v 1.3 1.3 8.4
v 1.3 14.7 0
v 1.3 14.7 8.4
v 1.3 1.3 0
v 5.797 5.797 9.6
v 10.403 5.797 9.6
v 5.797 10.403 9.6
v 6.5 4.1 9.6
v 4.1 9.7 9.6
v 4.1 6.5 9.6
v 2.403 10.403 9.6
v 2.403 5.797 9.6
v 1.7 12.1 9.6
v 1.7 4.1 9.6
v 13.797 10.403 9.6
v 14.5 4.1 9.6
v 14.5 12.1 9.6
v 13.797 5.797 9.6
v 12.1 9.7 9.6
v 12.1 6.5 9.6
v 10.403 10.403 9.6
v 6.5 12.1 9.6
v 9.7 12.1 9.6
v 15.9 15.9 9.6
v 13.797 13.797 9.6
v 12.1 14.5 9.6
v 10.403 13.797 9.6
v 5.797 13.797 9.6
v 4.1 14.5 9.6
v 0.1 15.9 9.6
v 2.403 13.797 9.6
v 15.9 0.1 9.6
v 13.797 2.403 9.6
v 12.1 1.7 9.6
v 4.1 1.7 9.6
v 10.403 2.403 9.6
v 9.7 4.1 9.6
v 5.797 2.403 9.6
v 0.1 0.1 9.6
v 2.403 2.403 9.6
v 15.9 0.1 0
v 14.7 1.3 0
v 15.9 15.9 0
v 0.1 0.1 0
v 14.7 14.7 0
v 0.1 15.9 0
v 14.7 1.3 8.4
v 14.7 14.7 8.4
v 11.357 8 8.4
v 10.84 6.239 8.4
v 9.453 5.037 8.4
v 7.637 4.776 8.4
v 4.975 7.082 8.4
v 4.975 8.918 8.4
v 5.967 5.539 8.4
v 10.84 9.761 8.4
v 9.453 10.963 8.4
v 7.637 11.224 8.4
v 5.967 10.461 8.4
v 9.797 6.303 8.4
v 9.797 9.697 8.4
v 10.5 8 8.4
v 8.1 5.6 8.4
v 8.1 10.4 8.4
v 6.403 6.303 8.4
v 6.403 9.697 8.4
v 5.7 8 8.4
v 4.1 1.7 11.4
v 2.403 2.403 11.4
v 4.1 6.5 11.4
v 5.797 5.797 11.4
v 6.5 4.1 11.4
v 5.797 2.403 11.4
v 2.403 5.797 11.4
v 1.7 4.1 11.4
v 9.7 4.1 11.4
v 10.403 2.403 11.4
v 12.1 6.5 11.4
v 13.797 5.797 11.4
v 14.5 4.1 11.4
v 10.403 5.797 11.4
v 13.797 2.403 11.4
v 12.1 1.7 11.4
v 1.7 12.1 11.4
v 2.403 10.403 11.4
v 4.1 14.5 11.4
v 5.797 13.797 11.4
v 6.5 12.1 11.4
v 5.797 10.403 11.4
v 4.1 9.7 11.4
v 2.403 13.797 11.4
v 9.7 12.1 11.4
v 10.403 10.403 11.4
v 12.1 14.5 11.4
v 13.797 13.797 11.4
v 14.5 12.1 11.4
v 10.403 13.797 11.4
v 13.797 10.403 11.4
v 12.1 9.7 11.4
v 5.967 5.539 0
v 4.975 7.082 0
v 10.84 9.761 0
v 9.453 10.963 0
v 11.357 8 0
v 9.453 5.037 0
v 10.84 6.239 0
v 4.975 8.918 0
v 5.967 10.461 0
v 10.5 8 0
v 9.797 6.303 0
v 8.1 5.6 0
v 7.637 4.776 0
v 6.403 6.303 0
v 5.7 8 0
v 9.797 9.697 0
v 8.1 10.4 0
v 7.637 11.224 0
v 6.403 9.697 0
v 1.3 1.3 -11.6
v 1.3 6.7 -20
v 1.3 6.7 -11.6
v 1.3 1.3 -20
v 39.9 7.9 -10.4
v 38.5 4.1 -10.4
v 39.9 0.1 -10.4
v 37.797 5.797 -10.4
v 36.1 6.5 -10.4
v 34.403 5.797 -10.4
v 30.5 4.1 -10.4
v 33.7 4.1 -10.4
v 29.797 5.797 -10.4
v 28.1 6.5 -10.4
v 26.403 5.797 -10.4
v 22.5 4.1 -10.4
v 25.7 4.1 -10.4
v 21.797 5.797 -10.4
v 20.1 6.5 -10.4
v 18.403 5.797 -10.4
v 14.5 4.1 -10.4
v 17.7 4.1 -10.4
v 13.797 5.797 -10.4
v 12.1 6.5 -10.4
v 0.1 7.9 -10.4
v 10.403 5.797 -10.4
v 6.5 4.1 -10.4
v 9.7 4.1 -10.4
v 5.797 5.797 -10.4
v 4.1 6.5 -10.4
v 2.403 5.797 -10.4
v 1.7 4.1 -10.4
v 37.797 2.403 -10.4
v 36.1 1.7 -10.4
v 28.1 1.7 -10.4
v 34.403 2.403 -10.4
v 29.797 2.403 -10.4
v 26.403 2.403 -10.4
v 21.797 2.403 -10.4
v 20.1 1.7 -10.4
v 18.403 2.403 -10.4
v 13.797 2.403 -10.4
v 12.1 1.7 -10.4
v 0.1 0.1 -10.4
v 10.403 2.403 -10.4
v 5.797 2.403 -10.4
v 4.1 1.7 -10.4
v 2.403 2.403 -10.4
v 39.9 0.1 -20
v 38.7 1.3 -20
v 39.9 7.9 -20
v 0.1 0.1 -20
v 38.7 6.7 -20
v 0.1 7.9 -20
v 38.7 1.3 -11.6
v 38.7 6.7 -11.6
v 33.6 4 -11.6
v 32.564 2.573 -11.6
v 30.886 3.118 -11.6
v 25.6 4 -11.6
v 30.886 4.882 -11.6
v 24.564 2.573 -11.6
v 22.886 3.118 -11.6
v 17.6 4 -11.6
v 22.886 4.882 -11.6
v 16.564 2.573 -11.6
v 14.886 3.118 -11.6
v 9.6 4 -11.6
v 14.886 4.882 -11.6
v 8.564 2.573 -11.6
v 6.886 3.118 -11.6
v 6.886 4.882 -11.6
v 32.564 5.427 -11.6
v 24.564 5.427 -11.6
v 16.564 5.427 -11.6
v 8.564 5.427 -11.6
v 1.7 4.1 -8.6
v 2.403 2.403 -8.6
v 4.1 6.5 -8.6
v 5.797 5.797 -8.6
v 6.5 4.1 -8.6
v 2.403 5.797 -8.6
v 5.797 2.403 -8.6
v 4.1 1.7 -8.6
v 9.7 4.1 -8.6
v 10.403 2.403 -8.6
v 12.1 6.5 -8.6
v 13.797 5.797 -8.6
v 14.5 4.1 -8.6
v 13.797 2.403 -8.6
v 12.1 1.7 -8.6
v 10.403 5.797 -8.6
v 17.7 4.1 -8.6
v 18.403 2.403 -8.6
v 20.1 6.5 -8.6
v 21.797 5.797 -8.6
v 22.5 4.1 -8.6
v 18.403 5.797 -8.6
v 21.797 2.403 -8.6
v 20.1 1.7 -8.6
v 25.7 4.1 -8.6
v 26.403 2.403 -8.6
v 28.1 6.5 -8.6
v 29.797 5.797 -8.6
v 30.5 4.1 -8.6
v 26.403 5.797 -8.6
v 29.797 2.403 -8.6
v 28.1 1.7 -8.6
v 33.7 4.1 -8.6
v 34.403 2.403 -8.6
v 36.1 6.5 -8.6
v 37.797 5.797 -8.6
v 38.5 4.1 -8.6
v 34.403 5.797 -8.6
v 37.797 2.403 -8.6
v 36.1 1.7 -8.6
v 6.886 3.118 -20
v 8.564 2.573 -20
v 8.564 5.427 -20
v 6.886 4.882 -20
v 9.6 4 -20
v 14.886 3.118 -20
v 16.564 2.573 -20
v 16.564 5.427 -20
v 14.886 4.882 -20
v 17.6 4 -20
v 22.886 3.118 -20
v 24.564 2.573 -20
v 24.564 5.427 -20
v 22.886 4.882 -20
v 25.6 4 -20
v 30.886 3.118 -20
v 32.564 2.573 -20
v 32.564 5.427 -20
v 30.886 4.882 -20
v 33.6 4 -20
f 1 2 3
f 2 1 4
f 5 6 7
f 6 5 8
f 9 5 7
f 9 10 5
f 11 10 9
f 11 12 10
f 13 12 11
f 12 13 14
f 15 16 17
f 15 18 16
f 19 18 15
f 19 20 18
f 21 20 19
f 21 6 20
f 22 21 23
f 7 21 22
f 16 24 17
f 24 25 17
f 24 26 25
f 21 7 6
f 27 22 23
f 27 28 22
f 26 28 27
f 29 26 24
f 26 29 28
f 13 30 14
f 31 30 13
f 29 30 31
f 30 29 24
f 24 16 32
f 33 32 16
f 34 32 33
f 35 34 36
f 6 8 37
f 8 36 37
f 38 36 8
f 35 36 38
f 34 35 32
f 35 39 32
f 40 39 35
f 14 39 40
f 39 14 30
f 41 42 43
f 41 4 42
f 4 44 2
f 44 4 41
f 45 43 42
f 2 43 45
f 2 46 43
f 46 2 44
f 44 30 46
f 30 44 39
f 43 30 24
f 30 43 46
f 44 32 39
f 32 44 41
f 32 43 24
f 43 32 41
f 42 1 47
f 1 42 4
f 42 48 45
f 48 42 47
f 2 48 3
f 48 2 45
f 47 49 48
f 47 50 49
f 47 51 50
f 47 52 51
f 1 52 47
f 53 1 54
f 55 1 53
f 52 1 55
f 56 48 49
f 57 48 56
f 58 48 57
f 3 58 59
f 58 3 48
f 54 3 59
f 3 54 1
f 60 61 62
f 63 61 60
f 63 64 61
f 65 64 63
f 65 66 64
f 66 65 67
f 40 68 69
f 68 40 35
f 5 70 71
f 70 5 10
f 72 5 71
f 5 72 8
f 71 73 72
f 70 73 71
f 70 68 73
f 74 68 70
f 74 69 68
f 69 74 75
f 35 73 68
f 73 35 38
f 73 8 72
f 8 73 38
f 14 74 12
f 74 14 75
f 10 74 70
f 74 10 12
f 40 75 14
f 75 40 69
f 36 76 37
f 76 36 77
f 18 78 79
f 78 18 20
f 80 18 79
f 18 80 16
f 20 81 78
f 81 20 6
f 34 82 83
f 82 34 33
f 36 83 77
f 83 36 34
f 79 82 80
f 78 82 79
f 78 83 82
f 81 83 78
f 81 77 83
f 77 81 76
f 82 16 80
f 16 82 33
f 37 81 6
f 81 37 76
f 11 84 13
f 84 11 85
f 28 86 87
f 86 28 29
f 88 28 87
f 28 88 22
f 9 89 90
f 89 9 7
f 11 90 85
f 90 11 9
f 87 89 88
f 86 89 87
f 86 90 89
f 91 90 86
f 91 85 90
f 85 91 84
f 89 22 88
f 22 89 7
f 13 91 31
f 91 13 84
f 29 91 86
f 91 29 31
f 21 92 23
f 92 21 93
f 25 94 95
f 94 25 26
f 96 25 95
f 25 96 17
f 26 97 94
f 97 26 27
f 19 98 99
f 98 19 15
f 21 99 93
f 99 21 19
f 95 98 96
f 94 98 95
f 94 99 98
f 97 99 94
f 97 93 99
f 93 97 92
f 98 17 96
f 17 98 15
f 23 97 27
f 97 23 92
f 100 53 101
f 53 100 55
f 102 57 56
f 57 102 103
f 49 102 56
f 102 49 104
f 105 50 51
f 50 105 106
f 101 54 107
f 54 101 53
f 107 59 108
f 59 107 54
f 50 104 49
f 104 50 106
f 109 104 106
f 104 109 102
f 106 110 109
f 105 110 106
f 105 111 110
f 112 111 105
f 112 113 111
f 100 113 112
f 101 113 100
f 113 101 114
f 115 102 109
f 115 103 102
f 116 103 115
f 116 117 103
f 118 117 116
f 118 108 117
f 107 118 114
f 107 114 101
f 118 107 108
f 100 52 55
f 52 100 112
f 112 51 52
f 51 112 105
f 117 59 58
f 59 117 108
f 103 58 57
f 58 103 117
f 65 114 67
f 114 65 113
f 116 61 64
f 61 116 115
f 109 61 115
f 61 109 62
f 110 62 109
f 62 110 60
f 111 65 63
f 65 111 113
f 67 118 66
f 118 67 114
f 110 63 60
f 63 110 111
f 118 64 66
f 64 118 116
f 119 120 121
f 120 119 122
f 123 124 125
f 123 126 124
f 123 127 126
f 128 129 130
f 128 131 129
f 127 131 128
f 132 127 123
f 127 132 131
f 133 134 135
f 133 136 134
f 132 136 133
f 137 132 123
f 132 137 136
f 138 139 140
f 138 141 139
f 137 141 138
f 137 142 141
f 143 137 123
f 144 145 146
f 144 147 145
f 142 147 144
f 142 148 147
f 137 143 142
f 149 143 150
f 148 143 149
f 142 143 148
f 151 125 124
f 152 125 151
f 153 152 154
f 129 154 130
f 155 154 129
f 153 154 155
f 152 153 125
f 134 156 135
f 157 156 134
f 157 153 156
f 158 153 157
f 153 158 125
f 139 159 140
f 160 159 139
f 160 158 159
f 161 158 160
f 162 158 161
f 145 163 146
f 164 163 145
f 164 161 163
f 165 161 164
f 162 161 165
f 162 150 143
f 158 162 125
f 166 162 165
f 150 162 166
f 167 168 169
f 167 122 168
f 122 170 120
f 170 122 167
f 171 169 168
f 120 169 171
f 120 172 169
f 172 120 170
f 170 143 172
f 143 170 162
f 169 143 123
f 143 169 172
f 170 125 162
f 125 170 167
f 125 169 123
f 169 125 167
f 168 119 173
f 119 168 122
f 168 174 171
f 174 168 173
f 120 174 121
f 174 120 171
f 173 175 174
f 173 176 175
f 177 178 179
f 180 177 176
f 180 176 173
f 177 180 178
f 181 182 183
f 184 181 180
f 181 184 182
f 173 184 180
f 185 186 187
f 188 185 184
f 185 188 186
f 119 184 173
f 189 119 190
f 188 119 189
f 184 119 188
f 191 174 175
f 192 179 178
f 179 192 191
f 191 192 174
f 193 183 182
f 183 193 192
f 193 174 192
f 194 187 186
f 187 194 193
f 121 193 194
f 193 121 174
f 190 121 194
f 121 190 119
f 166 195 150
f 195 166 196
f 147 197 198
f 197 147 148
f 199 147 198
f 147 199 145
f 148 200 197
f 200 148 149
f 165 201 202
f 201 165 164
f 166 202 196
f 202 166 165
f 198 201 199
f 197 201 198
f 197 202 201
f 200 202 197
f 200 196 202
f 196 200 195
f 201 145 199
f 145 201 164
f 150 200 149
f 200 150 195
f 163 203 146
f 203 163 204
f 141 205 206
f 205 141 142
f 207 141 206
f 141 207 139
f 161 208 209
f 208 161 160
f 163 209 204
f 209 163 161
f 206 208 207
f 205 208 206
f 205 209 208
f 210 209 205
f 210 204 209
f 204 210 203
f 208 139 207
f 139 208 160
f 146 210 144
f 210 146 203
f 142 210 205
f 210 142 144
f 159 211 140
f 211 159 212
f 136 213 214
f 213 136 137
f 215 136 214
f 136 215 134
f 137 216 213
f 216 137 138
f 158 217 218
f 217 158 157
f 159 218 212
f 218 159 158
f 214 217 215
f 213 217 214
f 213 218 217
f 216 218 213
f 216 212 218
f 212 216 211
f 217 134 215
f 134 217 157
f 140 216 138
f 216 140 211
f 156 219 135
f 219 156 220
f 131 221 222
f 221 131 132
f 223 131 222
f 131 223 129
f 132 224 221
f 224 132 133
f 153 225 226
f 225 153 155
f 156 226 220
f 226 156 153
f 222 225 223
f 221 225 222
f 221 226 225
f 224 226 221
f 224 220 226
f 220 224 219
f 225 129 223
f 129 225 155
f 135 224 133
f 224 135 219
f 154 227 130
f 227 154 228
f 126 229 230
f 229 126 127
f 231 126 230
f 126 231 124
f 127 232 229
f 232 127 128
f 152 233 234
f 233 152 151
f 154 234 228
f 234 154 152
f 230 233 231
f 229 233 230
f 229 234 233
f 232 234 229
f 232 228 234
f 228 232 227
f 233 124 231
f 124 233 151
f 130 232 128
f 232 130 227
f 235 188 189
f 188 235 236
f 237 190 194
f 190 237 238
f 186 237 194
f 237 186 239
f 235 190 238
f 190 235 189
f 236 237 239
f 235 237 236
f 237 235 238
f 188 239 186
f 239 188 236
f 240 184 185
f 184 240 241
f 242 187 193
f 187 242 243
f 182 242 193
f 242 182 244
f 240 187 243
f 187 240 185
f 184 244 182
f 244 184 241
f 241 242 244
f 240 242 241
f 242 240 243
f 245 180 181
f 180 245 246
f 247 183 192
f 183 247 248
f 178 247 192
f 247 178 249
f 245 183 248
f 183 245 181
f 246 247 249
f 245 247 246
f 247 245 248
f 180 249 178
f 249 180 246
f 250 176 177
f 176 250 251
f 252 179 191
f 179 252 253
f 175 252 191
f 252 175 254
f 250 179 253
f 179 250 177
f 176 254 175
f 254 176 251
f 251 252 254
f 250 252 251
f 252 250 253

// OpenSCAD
// building Lego bricks
// measurements taken from: http://www.robertcailliau.eu/Lego/Dimensions/zMeasurements-en.xhtml
// all copyrights and designs are property of their respective owners.

h_pitch = 8.0;
v_pitch = 9.6;
tol = 0.1;       // "play" in x and y directions
k_dia = 4.8;     // knob diameter
k_height = 1.8;  // knob height
wall = 1.2;      // wall thickness

brick_cyl_ex = 8*sqrt(2)-2*2.4;
brick_cyl_in = 4.8;
beam_cyl = 3.0;

module knob() {
  cylinder(h = k_height, r = k_dia/2);
}

module brick_cylinder() {
  difference() {
    cylinder(h=v_pitch, r=brick_cyl_ex/2);
    cylinder(h=v_pitch, r=brick_cyl_in/2);
  }
}

module beam_cylinder() {
  cylinder(h=v_pitch, r=beam_cyl/2);
}

module walls(w, d) {
  cube([wall, d, v_pitch]);    // left
  cube([w, wall, v_pitch]);    // front
  translate([w - wall, 0, 0])  // right
  cube([wall, d, v_pitch]);
  translate([0, d - wall, 0])  // rear
  cube([w, wall, v_pitch]);
  translate([0, 0, v_pitch - wall])  // top
  cube([w, d, wall]);
}

module brick(k) {
  // builds a Lego brick based on the number of knobs
  width = k*h_pitch - 2*tol;
  depth = 2*h_pitch - 2*tol;
  
  // build walls
  translate([tol, tol, 0])
  walls(width, depth);

  // place knobs
  for (i = [1:2]) {
    for (j = [1:k]) {
      translate([tol+((2*j-1)*h_pitch/2), tol+((2*i-1)*h_pitch/2), v_pitch])
      knob();
    }  
  }

  // internal cylinders
  if (k > 1) {
    for (i = [1:k-1]) {
      translate([tol+h_pitch*i, tol+depth/2, 0])
      brick_cylinder();
    }
  }
}

module beam(k) {
  width = k*h_pitch - 2*tol;
  depth = h_pitch - 2*tol;

  translate([tol, tol, 0])
  walls(width, depth);

  for (i = [1:k]) {
    translate([tol+((2*i-1)*h_pitch/2), tol+(h_pitch/2), v_pitch])
    knob();
  }

  if (k > 1) {
    for (i = [1:k-1]) {
      translate([tol+h_pitch*i, tol+depth/2, 0])
      beam_cylinder();
    }
  }
}

brick(2);

translate([0, 0, -20])
beam(5);
